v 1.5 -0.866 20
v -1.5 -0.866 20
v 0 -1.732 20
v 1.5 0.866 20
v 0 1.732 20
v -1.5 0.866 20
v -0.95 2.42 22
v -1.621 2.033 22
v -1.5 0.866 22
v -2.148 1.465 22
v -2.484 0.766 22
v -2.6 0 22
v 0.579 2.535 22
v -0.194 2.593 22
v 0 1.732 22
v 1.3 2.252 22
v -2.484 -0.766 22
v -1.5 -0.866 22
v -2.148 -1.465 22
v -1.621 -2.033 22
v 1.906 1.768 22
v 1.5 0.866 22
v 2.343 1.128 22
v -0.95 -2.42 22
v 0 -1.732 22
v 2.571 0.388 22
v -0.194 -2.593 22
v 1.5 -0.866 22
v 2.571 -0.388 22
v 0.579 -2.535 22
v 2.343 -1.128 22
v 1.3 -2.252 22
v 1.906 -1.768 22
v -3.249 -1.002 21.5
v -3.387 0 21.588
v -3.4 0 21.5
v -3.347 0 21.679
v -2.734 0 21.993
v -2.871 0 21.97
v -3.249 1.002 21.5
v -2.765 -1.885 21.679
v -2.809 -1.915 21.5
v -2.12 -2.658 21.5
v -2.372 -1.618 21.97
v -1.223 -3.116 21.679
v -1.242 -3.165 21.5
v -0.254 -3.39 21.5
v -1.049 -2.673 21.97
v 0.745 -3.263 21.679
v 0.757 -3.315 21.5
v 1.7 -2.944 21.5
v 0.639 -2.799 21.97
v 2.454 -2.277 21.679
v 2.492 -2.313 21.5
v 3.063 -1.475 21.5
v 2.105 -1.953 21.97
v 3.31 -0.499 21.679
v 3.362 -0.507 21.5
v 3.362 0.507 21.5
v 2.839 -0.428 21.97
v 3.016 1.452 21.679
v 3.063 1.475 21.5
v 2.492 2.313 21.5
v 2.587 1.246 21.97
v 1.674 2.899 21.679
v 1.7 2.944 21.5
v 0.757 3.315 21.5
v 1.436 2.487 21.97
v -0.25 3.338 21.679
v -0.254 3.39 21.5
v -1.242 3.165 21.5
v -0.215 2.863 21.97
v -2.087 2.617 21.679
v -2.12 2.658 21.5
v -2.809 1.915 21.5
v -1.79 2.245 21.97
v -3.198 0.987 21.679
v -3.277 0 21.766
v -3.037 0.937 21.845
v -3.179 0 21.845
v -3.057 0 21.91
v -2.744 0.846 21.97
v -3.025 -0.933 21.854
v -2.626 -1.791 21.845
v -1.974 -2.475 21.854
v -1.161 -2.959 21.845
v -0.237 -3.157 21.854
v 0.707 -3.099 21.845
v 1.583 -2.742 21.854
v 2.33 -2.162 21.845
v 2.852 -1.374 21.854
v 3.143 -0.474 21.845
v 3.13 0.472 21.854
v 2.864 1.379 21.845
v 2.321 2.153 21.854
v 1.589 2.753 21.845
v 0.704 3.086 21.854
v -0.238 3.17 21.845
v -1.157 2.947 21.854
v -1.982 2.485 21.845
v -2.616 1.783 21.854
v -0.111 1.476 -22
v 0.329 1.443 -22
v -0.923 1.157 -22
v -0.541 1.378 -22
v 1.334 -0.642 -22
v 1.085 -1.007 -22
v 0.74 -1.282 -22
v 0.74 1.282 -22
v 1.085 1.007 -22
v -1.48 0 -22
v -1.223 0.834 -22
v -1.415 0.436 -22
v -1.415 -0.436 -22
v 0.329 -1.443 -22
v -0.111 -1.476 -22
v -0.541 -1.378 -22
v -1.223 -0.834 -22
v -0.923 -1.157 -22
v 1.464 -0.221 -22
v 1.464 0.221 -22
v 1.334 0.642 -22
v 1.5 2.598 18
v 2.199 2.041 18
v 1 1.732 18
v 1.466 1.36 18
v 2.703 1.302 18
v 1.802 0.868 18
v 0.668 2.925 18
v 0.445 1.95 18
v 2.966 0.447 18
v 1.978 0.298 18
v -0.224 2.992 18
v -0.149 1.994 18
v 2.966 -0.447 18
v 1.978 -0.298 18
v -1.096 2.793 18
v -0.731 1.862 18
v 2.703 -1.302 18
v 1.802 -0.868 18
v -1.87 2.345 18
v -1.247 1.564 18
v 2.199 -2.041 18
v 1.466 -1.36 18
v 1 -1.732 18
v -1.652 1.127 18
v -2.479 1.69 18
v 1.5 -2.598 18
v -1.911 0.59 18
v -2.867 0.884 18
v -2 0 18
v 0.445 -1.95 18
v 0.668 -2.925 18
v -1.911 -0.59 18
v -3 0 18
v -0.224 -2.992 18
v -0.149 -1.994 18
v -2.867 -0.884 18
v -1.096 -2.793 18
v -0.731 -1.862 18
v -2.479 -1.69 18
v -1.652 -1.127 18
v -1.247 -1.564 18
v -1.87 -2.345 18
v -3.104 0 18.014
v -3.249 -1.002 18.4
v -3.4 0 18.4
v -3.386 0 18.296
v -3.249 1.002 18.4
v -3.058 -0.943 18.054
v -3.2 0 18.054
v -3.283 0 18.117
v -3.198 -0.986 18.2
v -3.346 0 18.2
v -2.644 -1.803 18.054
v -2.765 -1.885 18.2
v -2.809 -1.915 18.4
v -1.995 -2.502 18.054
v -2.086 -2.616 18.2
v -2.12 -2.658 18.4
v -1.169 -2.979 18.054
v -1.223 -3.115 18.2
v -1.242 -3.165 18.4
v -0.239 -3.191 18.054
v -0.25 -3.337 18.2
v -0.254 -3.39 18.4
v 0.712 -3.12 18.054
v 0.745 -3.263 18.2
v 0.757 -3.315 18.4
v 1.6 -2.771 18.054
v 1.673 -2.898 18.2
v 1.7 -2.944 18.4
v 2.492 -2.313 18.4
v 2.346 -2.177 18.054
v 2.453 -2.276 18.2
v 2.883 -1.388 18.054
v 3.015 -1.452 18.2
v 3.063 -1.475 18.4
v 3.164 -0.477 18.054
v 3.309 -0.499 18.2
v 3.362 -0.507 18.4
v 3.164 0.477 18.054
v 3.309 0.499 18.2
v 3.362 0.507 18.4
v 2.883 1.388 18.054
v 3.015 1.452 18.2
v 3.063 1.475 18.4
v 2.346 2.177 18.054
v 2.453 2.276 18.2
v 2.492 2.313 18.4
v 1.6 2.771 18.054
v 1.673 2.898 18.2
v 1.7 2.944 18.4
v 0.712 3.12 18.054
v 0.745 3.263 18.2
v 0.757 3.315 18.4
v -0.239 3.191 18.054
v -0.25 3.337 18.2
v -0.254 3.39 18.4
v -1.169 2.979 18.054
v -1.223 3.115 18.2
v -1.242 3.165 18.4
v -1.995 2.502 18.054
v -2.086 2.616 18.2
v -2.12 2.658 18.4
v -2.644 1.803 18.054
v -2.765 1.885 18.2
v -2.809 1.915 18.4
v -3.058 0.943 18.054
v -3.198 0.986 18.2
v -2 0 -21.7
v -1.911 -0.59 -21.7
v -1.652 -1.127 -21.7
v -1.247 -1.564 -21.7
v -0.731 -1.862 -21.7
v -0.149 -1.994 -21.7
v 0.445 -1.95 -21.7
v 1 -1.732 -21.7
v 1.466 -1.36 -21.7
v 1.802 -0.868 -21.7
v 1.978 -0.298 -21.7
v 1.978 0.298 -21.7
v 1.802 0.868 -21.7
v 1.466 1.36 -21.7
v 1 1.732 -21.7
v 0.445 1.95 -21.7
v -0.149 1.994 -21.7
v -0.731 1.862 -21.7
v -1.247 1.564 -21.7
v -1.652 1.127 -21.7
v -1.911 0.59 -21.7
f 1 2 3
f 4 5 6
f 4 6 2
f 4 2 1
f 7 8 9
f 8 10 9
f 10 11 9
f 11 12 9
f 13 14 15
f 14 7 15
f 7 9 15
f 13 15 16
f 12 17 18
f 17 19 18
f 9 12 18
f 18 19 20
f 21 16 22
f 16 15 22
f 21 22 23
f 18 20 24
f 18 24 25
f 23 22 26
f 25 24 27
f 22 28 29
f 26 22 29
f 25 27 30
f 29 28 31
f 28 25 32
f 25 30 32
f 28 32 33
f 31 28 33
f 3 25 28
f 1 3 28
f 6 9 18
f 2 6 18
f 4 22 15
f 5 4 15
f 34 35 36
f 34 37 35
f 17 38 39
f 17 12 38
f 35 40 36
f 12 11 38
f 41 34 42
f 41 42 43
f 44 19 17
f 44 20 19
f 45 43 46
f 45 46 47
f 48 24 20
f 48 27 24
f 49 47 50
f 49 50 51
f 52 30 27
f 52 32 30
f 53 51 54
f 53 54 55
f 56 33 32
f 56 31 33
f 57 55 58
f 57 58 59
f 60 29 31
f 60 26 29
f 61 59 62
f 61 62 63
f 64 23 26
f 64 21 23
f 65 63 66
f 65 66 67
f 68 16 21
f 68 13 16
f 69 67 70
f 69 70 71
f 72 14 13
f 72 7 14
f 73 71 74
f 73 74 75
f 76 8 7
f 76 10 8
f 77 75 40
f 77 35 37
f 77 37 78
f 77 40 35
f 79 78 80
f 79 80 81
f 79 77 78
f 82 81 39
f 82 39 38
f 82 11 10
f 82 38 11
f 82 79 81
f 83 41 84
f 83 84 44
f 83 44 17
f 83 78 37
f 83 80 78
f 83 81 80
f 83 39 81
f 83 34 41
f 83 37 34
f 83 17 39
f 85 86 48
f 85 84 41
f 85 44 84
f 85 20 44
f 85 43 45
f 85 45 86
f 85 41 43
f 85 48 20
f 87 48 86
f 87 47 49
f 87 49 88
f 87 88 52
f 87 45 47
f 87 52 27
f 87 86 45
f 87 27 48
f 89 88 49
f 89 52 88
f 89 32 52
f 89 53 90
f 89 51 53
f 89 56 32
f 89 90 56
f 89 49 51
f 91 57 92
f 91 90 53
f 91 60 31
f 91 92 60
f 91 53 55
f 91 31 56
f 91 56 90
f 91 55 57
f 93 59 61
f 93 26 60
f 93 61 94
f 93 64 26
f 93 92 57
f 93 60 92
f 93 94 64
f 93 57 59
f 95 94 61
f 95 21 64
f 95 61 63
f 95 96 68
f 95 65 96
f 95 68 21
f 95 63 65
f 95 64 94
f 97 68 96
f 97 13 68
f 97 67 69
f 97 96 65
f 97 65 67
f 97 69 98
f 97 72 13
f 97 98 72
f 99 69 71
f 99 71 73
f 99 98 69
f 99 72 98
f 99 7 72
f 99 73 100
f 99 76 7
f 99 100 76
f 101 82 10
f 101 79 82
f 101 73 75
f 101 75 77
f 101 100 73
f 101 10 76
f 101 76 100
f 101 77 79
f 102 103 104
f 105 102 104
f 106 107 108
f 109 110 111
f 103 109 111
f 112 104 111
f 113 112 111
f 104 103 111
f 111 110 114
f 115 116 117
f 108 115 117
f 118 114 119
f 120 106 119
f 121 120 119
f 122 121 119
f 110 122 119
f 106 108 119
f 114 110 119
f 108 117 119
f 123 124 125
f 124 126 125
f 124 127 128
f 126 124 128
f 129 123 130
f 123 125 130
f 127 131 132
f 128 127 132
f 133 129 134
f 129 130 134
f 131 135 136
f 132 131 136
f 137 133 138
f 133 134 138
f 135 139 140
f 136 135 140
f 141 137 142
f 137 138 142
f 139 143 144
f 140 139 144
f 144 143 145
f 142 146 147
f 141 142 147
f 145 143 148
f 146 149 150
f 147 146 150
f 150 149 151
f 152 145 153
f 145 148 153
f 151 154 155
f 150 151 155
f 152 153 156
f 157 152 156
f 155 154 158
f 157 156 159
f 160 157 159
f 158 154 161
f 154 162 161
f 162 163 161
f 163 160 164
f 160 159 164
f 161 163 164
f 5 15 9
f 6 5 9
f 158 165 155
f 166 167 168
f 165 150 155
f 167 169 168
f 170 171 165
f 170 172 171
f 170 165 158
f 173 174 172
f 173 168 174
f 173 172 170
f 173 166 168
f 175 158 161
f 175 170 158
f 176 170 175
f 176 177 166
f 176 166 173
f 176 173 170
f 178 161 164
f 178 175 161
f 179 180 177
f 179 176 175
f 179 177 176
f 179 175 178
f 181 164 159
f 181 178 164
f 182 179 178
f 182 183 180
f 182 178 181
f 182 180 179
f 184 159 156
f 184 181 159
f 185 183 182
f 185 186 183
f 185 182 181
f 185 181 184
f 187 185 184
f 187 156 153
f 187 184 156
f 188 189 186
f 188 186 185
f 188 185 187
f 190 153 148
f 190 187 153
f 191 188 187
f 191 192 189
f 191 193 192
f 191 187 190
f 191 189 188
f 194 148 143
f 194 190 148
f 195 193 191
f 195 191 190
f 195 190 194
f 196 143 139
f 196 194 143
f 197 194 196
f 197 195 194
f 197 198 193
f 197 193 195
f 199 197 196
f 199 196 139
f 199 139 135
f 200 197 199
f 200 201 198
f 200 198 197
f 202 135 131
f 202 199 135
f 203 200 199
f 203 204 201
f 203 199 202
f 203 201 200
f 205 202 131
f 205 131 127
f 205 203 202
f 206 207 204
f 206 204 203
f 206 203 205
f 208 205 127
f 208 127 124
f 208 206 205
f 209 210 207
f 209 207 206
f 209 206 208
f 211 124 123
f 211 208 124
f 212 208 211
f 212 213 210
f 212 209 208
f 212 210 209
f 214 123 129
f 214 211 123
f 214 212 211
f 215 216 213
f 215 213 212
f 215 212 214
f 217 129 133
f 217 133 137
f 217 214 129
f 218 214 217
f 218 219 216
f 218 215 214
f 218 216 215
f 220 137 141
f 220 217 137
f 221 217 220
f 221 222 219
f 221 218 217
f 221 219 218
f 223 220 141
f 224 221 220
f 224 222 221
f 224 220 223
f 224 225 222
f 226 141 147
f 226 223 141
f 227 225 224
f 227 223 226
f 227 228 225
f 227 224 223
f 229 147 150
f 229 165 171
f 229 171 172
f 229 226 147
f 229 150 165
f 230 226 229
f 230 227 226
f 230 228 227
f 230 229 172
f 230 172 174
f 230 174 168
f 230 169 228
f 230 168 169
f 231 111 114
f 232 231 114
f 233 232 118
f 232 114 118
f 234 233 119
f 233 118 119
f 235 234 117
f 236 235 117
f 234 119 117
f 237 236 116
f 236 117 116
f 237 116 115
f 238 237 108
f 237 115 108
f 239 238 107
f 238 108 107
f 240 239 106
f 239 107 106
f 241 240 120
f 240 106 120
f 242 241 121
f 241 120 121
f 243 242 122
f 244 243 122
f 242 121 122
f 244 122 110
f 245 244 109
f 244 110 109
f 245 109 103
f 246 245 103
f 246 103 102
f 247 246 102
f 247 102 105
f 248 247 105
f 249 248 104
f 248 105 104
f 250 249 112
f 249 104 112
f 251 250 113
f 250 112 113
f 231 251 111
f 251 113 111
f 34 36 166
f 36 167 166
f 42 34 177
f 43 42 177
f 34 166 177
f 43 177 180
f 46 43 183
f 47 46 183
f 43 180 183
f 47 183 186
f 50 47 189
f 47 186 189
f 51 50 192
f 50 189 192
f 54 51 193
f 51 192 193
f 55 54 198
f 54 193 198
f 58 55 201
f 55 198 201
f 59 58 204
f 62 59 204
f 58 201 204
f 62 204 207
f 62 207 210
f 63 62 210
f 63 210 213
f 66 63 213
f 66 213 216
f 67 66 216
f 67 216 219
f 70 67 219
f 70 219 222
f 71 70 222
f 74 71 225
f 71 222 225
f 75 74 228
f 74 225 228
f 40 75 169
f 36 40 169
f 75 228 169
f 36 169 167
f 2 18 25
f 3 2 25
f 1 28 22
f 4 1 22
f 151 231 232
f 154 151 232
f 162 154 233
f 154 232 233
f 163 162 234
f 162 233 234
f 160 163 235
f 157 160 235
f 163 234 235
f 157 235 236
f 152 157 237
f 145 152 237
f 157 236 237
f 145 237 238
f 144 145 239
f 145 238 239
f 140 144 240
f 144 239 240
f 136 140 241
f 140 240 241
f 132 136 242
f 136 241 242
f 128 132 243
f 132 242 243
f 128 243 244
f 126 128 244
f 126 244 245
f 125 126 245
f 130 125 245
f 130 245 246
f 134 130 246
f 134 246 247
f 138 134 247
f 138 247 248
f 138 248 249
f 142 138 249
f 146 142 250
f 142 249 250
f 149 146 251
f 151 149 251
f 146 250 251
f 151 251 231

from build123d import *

# Parameters (mm, degrees)
CHAMFER_1_SIZE      = 0.3
CHAMFER_1_SIZE2     = 0.519615242
FILLET_1_R          = 0.4
FILLET_2_SIZE       = 0.5
FILLET_2_SIZE_2     = 0.8
CUT_EXTRUDE_1_DEPTH = 2


with BuildPart() as part:
    # 草图2 → 旋转1 (revolve)
    with BuildSketch(Plane(origin=(0, 0, 0), x_dir=(0, 0, -1), z_dir=(1, 0, 0)), mode=Mode.PRIVATE) as revolve_1_sk:
        Polygon((-22, 0), (-22, 3.4), (-18, 3.4), (-18, 2), (22, 2), (22, 0), align=None)
    revolve(revolve_1_sk.sketch.rotate(Axis((0, 0, -22), (0, 0, 1)), 90), axis=Axis((0, 0, -22), (0, 0, 1)))

    # 倒角1
    chamfer_1_edges = [part.edges().sort_by_distance(p)[0] for p in [
        (2, 0, -22),
    ]]
    chamfer_1_side = [part.faces().sort_by_distance(p)[0] for p in [
        (2, 0, -2),
    ]]
    chamfer(chamfer_1_edges, length=CHAMFER_1_SIZE, length2=CHAMFER_1_SIZE2, reference=chamfer_1_side[0])

    # 圆角1
    fillet_1_edges = [part.edges().sort_by_distance(p)[0] for p in [
        (3.4, 0, 18),
    ]]
    fillet(fillet_1_edges, radius=FILLET_1_R)

    # 圆角2
    # an asymmetric fillet: 0.8, 0.5 mm, written as the material it takes off along each edge
    with BuildSketch(Plane(origin=(0, 0, 22), x_dir=(-1, 0, 0), z_dir=(0, 1, 0))) as fillet_2_piece_1:
        with BuildLine():
            Bezier((3.4, -FILLET_2_SIZE), (3.4, 0), (3.4 - FILLET_2_SIZE_2, 0), weights=[1, 0.707106781, 1])
            Line((3.4 - FILLET_2_SIZE_2, 0), (3.4, 0))
            Line((3.4, 0), (3.4, -FILLET_2_SIZE))
        make_face()
    revolve(axis=Axis((0, 0, 22), (0, 0, 1)), mode=Mode.SUBTRACT)

    # 草图3 → 切除-拉伸1 (cut)
    with BuildSketch(Plane.XY.offset(22)):
        Polygon((0, 1.732050808), (-1.5, 0.866025404), (-1.5, -0.866025404), (0, -1.732050808), (1.5, -0.866025404), (1.5, 0.866025404), align=None)
    extrude(amount=-CUT_EXTRUDE_1_DEPTH, mode=Mode.SUBTRACT)


solid = part.part
